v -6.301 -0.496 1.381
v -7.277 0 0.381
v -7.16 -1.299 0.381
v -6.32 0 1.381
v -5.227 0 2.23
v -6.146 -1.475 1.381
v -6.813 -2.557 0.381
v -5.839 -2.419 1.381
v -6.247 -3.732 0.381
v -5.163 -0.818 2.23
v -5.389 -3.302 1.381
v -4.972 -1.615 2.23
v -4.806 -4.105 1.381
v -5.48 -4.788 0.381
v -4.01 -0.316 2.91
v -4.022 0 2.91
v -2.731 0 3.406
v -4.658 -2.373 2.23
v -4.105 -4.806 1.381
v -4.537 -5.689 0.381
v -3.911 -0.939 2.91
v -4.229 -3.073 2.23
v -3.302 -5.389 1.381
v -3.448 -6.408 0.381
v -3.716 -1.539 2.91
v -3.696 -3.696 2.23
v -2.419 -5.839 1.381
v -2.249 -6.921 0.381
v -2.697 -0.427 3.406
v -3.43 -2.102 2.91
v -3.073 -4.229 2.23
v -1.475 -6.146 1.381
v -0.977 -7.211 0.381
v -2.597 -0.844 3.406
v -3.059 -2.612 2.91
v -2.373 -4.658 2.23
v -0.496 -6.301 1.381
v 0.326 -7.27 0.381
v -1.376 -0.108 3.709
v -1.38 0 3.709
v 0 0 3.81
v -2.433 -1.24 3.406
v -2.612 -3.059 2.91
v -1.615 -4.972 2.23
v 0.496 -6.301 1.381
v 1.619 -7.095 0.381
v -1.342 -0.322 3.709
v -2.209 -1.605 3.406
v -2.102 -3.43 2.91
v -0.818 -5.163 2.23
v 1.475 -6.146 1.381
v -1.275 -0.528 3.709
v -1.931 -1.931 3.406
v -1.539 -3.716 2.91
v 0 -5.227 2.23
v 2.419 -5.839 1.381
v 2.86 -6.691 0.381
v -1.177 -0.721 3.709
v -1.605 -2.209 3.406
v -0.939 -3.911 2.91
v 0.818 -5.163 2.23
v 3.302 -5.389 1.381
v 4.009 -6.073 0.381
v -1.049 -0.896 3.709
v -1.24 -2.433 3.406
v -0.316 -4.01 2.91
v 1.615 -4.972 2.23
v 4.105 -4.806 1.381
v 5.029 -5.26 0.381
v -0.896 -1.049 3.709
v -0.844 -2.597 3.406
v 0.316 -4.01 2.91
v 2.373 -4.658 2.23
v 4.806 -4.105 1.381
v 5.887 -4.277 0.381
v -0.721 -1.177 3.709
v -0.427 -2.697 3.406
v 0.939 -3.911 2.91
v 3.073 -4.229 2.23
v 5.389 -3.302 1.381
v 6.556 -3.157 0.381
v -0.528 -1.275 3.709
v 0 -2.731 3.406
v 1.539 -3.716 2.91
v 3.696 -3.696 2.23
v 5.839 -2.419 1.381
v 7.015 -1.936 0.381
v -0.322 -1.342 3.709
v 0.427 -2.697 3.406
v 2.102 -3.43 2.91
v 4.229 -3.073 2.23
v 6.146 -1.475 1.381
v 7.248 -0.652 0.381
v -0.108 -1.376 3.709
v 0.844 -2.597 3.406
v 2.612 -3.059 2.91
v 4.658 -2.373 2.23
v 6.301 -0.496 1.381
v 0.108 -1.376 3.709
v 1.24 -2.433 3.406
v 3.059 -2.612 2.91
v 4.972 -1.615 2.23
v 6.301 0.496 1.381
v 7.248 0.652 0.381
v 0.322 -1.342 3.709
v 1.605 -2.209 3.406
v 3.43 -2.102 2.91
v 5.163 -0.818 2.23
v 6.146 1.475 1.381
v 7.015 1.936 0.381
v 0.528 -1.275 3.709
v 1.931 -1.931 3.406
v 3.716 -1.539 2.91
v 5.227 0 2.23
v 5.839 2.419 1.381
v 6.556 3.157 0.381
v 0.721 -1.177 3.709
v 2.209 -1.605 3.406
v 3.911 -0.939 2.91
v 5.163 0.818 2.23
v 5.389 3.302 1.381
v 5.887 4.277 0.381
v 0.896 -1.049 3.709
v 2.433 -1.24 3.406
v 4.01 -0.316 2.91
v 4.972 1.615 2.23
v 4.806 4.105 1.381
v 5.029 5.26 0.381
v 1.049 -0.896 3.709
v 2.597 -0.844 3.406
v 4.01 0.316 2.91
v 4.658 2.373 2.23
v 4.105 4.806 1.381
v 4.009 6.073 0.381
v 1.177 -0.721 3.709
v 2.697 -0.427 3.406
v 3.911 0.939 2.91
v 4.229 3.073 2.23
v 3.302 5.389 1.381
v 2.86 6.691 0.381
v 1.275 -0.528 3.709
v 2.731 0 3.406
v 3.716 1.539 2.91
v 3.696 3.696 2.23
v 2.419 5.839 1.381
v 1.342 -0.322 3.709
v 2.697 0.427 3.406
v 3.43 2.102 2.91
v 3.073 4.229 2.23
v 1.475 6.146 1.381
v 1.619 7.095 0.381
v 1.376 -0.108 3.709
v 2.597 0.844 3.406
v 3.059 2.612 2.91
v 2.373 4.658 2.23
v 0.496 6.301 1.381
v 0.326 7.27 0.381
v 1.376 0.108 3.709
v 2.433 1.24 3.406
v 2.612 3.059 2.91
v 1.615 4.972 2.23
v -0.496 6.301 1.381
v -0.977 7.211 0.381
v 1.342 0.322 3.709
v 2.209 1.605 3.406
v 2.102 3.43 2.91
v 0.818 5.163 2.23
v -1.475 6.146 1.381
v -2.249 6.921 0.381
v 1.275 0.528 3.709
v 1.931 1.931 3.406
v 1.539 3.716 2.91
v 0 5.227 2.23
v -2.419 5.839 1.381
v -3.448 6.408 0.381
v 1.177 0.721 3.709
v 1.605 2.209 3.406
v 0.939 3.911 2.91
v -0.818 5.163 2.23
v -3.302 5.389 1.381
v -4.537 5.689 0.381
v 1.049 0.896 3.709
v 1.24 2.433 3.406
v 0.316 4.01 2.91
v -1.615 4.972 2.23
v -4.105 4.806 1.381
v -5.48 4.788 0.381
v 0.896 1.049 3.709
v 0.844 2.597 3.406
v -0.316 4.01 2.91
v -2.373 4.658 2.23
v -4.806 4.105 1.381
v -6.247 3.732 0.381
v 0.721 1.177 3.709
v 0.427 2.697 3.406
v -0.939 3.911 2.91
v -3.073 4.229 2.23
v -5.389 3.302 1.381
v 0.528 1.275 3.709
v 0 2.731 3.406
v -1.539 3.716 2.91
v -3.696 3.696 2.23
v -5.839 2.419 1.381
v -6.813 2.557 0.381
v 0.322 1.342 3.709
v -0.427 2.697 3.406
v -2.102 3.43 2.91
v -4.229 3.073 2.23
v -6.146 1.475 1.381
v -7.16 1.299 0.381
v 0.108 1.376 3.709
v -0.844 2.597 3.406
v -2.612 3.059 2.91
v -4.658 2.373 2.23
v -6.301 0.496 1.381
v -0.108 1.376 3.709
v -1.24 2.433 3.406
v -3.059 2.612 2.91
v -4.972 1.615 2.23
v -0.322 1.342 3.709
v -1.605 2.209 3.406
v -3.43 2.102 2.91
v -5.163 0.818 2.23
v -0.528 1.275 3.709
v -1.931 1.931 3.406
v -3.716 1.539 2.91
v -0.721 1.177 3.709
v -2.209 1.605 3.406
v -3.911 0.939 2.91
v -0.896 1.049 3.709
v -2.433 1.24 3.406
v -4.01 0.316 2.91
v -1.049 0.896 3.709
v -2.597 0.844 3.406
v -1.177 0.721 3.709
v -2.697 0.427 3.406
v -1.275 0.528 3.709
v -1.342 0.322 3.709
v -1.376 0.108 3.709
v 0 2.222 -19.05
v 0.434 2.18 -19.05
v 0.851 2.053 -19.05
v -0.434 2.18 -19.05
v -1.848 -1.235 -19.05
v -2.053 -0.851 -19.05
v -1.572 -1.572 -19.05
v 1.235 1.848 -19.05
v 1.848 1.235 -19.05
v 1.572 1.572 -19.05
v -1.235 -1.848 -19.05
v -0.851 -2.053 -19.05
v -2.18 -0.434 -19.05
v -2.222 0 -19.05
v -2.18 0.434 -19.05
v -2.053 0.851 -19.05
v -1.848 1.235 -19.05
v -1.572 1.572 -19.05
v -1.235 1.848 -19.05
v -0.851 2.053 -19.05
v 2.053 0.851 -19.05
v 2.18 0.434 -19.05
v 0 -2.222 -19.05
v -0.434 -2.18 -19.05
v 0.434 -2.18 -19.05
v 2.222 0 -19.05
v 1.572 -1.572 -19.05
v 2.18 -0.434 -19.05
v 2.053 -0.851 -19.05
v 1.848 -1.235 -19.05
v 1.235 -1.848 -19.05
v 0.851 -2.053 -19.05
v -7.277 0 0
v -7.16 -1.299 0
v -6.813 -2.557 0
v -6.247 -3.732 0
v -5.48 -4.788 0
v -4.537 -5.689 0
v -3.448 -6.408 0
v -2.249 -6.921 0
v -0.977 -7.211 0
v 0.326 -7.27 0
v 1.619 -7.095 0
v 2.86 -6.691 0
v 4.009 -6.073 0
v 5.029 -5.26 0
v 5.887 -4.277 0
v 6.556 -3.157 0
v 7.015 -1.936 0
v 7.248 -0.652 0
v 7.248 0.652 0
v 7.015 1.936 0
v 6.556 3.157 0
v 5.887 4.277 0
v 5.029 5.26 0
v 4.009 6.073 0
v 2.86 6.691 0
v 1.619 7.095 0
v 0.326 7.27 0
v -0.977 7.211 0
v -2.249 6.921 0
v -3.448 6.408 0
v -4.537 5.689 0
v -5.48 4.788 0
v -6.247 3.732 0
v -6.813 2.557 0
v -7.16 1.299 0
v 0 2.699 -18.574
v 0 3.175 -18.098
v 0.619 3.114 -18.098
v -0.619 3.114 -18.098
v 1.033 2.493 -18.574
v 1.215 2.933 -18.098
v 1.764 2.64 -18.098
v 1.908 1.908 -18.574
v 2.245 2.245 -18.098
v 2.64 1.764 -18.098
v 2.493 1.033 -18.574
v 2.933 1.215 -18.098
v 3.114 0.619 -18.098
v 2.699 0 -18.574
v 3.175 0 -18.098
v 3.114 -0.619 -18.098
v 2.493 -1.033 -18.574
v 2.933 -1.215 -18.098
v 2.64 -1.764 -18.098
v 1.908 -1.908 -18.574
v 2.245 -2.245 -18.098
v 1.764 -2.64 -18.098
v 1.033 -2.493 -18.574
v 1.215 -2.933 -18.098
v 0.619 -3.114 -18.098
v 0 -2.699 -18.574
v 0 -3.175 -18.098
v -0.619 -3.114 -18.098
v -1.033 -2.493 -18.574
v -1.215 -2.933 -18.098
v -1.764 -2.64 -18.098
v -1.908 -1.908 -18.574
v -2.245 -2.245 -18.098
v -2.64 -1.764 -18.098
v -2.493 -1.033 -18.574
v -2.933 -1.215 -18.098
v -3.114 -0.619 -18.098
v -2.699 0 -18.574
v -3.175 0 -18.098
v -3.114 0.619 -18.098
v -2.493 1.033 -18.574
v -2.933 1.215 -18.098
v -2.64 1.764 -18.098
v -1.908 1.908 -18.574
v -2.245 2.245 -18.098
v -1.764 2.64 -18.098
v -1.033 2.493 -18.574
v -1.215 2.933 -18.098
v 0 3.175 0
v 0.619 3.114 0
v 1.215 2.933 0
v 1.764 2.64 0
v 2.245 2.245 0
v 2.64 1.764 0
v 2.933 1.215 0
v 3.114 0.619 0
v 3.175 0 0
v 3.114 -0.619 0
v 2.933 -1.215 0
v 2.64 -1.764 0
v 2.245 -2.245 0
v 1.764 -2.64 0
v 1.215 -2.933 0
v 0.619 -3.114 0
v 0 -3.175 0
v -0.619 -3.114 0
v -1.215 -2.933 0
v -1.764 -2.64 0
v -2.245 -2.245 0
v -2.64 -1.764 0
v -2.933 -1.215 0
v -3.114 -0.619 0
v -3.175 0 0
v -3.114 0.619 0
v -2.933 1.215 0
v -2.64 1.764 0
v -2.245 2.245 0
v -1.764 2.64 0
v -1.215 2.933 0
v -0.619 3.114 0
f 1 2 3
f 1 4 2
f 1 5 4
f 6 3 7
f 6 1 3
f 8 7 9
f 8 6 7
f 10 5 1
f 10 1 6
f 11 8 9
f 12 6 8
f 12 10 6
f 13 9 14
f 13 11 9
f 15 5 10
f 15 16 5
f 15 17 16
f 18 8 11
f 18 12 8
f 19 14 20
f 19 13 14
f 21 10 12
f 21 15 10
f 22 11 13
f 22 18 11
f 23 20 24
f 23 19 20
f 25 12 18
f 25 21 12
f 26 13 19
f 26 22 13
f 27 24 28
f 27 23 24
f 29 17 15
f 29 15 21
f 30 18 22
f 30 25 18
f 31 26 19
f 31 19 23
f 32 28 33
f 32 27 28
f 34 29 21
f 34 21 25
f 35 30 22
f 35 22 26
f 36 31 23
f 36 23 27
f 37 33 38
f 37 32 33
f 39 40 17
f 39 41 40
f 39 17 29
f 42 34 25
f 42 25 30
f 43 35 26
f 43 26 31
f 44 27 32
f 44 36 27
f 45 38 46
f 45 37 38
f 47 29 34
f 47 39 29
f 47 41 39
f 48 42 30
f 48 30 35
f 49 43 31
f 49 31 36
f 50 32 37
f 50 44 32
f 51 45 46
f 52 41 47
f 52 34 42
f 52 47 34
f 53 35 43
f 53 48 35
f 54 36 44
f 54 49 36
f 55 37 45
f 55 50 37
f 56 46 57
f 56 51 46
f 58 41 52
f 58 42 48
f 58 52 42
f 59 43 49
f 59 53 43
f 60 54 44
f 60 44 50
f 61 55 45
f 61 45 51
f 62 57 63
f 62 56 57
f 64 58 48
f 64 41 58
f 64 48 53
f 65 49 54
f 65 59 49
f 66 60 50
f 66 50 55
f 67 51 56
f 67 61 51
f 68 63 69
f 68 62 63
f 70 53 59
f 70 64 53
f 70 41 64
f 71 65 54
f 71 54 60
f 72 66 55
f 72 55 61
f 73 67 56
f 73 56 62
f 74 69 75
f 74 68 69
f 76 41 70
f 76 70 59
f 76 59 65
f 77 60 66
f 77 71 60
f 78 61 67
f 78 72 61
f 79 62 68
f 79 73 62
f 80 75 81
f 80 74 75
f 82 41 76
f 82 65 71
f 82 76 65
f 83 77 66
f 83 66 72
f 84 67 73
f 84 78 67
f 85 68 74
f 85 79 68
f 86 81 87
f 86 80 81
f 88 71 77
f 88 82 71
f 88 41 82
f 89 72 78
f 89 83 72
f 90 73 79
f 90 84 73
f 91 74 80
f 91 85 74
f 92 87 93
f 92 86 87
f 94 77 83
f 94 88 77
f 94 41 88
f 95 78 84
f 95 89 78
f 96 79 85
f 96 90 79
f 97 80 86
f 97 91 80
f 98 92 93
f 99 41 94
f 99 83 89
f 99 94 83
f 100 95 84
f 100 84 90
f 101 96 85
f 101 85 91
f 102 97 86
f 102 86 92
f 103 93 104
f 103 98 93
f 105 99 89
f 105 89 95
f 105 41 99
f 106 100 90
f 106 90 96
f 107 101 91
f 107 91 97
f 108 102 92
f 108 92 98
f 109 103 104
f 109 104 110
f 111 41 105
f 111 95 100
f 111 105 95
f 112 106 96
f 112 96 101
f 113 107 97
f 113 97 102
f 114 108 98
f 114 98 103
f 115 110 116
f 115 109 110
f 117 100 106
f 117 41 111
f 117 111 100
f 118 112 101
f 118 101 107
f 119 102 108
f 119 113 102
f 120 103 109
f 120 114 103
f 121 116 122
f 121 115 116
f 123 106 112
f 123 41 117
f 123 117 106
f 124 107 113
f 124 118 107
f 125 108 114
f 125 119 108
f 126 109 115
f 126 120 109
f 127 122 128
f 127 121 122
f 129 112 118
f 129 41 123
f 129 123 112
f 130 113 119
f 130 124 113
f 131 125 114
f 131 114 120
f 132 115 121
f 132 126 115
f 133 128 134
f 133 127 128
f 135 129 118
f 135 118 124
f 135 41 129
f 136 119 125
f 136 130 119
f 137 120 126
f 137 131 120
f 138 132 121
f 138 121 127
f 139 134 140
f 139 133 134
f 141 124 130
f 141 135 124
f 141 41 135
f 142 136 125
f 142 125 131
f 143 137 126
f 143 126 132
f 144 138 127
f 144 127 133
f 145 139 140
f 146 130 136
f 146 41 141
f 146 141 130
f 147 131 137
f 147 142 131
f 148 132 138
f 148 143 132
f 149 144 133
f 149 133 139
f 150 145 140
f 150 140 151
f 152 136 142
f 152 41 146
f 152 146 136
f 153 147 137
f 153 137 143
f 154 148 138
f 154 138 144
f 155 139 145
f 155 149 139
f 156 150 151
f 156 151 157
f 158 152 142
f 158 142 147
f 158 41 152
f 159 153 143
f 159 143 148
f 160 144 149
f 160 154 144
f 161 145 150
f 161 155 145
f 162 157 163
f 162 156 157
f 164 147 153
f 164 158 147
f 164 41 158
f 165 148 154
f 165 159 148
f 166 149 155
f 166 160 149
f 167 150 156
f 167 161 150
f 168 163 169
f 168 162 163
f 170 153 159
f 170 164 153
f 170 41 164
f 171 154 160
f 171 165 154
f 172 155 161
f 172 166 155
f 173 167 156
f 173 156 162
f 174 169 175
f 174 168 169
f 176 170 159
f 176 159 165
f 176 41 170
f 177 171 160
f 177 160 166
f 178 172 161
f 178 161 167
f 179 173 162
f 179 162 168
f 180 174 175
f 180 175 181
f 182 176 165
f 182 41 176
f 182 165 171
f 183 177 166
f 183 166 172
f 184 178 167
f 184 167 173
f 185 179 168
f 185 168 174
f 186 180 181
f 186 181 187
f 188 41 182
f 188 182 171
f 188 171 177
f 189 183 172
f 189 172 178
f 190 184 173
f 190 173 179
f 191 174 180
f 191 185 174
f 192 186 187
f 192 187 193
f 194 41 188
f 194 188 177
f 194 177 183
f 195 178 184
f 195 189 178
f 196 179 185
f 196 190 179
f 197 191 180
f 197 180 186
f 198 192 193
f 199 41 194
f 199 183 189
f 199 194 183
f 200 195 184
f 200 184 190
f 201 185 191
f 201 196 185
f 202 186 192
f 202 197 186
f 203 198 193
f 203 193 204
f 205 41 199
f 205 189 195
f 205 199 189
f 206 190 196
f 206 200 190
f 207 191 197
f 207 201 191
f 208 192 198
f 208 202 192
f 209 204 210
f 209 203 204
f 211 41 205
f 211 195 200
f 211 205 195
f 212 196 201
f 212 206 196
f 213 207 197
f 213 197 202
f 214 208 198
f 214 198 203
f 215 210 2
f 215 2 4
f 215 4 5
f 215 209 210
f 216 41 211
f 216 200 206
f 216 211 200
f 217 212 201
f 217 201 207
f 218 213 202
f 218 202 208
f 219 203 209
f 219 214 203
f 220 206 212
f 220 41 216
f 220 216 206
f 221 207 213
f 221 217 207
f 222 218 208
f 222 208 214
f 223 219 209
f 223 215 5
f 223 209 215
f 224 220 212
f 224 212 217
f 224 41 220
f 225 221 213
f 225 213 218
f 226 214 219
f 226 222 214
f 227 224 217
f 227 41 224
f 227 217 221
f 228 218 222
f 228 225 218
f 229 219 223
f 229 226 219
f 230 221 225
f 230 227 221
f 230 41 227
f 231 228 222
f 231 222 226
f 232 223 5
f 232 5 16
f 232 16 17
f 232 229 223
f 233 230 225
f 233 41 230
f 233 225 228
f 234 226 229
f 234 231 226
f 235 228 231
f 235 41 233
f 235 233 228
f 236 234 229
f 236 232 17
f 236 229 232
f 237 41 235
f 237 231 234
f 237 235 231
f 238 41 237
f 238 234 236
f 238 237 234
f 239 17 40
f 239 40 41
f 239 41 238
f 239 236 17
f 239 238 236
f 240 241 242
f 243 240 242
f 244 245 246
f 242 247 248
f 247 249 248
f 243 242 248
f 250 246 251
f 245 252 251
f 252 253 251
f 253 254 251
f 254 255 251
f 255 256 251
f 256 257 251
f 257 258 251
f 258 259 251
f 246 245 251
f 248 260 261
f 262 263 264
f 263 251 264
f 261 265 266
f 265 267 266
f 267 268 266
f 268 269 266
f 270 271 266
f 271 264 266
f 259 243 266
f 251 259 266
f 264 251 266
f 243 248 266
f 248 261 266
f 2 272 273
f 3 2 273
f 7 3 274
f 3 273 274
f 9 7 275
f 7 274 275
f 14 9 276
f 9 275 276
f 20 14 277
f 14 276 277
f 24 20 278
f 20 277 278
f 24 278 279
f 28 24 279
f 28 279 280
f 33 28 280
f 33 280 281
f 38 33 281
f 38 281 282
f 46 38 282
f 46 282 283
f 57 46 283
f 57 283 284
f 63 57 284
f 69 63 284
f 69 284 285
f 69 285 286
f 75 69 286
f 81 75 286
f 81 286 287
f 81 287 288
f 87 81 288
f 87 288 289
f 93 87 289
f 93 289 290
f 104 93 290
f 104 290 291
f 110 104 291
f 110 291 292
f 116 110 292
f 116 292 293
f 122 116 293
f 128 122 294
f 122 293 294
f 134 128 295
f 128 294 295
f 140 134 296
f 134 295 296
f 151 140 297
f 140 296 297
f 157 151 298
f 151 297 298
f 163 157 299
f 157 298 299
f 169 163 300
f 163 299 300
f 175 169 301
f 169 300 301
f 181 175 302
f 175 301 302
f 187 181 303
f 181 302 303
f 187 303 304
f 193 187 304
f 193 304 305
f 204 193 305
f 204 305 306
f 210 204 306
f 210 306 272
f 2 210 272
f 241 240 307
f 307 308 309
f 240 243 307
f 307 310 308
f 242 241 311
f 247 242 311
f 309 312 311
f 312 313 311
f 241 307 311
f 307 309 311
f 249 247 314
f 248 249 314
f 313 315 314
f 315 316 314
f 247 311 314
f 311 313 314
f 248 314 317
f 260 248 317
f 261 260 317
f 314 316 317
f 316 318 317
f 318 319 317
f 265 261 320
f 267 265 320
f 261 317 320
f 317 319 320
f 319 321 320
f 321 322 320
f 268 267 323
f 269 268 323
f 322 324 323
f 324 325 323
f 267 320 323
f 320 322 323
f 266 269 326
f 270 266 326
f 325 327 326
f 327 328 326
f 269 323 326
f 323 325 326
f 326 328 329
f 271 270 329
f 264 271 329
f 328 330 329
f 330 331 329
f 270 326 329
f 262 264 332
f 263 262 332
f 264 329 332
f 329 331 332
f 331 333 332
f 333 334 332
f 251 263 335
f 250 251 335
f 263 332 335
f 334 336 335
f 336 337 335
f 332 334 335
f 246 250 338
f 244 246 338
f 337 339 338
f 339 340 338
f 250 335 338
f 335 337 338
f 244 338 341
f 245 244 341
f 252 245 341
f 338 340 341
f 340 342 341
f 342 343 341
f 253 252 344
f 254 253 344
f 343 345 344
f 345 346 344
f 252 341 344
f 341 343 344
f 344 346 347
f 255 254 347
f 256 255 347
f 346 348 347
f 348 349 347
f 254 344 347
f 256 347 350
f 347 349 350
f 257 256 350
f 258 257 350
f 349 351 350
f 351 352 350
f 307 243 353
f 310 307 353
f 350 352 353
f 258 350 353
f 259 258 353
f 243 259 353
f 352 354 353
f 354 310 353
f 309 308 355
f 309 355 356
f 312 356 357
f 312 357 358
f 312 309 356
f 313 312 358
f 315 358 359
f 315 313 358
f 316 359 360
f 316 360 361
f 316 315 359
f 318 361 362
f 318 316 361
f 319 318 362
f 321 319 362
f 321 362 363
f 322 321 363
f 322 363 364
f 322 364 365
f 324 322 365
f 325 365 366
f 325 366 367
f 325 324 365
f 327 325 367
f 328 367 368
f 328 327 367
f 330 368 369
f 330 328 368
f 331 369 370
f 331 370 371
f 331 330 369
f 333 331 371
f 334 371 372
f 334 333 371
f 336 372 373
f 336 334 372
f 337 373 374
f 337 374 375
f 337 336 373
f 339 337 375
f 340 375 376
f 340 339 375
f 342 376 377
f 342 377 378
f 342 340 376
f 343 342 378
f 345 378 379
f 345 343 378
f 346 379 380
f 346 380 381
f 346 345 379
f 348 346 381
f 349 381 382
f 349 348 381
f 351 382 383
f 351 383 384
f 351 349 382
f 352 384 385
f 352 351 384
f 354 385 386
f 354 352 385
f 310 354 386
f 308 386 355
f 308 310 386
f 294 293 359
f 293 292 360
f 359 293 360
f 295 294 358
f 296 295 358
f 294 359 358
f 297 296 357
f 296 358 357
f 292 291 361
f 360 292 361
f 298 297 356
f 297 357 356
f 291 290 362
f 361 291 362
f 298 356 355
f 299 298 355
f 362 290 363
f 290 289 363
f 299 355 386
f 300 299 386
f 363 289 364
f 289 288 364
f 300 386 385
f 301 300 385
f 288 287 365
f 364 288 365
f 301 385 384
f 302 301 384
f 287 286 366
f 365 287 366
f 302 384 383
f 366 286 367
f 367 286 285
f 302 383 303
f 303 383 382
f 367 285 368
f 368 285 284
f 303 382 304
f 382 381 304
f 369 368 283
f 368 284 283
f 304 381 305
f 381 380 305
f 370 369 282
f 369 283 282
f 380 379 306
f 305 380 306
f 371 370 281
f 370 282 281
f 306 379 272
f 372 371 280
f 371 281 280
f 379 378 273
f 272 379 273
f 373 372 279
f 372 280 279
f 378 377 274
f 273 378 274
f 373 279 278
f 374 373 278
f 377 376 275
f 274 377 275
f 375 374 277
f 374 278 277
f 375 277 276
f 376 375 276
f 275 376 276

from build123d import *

# Parameters (mm, degrees)
SKETCH1_R            = 7.2771
EXTRUDE3_DEPTH       = 3.81
SKETCH4_W            = 19.05
SKETCH4_H            = 3.175
CHAMFER2_SIZE        = 0.9525
EXTRUDE13_REACH      = 23.652
EXTRUDE13_END_RADIUS = 9.436311667
SKETCH26_R           = 0.5461


with BuildPart() as part:
    # Sketch1 → Extrude3 (new body)
    with BuildSketch(Plane.XY):
        Circle(SKETCH1_R)
    extrude(amount=EXTRUDE3_DEPTH)

    # Sketch11 → Cut-Revolve3 (revolve, cut)
    with BuildSketch(Plane(origin=(0, 0, 0), x_dir=(0, 0, -1), z_dir=(1, 0, 0))):
        with BuildLine():
            Line((-4.064, 8.73252), (0, 8.73252))
            Line((0, 8.73252), (0, 7.2771))
            Line((0, 7.2771), (-0.381, 7.2771))
            ThreePointArc((-0.381, 7.2771), (-2.909812836, 4.022257619), (-3.81, 0))
            Line((-3.81, 0), (-4.064, 0))
            Line((-4.064, 0), (-4.064, 8.73252))
        make_face()
    revolve(axis=Axis((0, 0, 0), (0, 0, 1)), mode=Mode.SUBTRACT)



with BuildPart() as body_2:
    # Sketch4 → Revolve1 (revolve)
    with BuildSketch(Plane(origin=(0, 0, 0), x_dir=(0, 0, -1), z_dir=(1, 0, 0))):
        with Locations((9.525, 1.5875)):
            Rectangle(SKETCH4_W, SKETCH4_H)
    revolve(axis=Axis((0, 0, 0), (0, 0, -1)))

    # Chamfer2
    chamfer2_edges = [body_2.edges().sort_by_distance(p)[0] for p in [
        (0, -3.175, -19.05),
    ]]
    chamfer(chamfer2_edges, length=CHAMFER2_SIZE)


with BuildPart() as part_1:
    add(part.part)

    add(body_2.part)  # Extrude13 merges body 2
    # Extrude13: up to this sphere (the profile starts inside it)
    extrude13_end = Location((0, 0, -5.626311667)) * Sphere(EXTRUDE13_END_RADIUS, mode=Mode.PRIVATE)
    # Sketch26 → Extrude13 (add, up to the surface)
    with BuildSketch(Plane.XY, mode=Mode.PRIVATE) as extrude13_sk1:
        Circle(SKETCH26_R)
    extrude13_tool1 = extrude(extrude13_sk1.sketch, amount=EXTRUDE13_REACH, mode=Mode.PRIVATE) & extrude13_end
    add(extrude13_tool1.solids().sort_by_distance((0, 0, 0))[0])


solid = part_1.part
